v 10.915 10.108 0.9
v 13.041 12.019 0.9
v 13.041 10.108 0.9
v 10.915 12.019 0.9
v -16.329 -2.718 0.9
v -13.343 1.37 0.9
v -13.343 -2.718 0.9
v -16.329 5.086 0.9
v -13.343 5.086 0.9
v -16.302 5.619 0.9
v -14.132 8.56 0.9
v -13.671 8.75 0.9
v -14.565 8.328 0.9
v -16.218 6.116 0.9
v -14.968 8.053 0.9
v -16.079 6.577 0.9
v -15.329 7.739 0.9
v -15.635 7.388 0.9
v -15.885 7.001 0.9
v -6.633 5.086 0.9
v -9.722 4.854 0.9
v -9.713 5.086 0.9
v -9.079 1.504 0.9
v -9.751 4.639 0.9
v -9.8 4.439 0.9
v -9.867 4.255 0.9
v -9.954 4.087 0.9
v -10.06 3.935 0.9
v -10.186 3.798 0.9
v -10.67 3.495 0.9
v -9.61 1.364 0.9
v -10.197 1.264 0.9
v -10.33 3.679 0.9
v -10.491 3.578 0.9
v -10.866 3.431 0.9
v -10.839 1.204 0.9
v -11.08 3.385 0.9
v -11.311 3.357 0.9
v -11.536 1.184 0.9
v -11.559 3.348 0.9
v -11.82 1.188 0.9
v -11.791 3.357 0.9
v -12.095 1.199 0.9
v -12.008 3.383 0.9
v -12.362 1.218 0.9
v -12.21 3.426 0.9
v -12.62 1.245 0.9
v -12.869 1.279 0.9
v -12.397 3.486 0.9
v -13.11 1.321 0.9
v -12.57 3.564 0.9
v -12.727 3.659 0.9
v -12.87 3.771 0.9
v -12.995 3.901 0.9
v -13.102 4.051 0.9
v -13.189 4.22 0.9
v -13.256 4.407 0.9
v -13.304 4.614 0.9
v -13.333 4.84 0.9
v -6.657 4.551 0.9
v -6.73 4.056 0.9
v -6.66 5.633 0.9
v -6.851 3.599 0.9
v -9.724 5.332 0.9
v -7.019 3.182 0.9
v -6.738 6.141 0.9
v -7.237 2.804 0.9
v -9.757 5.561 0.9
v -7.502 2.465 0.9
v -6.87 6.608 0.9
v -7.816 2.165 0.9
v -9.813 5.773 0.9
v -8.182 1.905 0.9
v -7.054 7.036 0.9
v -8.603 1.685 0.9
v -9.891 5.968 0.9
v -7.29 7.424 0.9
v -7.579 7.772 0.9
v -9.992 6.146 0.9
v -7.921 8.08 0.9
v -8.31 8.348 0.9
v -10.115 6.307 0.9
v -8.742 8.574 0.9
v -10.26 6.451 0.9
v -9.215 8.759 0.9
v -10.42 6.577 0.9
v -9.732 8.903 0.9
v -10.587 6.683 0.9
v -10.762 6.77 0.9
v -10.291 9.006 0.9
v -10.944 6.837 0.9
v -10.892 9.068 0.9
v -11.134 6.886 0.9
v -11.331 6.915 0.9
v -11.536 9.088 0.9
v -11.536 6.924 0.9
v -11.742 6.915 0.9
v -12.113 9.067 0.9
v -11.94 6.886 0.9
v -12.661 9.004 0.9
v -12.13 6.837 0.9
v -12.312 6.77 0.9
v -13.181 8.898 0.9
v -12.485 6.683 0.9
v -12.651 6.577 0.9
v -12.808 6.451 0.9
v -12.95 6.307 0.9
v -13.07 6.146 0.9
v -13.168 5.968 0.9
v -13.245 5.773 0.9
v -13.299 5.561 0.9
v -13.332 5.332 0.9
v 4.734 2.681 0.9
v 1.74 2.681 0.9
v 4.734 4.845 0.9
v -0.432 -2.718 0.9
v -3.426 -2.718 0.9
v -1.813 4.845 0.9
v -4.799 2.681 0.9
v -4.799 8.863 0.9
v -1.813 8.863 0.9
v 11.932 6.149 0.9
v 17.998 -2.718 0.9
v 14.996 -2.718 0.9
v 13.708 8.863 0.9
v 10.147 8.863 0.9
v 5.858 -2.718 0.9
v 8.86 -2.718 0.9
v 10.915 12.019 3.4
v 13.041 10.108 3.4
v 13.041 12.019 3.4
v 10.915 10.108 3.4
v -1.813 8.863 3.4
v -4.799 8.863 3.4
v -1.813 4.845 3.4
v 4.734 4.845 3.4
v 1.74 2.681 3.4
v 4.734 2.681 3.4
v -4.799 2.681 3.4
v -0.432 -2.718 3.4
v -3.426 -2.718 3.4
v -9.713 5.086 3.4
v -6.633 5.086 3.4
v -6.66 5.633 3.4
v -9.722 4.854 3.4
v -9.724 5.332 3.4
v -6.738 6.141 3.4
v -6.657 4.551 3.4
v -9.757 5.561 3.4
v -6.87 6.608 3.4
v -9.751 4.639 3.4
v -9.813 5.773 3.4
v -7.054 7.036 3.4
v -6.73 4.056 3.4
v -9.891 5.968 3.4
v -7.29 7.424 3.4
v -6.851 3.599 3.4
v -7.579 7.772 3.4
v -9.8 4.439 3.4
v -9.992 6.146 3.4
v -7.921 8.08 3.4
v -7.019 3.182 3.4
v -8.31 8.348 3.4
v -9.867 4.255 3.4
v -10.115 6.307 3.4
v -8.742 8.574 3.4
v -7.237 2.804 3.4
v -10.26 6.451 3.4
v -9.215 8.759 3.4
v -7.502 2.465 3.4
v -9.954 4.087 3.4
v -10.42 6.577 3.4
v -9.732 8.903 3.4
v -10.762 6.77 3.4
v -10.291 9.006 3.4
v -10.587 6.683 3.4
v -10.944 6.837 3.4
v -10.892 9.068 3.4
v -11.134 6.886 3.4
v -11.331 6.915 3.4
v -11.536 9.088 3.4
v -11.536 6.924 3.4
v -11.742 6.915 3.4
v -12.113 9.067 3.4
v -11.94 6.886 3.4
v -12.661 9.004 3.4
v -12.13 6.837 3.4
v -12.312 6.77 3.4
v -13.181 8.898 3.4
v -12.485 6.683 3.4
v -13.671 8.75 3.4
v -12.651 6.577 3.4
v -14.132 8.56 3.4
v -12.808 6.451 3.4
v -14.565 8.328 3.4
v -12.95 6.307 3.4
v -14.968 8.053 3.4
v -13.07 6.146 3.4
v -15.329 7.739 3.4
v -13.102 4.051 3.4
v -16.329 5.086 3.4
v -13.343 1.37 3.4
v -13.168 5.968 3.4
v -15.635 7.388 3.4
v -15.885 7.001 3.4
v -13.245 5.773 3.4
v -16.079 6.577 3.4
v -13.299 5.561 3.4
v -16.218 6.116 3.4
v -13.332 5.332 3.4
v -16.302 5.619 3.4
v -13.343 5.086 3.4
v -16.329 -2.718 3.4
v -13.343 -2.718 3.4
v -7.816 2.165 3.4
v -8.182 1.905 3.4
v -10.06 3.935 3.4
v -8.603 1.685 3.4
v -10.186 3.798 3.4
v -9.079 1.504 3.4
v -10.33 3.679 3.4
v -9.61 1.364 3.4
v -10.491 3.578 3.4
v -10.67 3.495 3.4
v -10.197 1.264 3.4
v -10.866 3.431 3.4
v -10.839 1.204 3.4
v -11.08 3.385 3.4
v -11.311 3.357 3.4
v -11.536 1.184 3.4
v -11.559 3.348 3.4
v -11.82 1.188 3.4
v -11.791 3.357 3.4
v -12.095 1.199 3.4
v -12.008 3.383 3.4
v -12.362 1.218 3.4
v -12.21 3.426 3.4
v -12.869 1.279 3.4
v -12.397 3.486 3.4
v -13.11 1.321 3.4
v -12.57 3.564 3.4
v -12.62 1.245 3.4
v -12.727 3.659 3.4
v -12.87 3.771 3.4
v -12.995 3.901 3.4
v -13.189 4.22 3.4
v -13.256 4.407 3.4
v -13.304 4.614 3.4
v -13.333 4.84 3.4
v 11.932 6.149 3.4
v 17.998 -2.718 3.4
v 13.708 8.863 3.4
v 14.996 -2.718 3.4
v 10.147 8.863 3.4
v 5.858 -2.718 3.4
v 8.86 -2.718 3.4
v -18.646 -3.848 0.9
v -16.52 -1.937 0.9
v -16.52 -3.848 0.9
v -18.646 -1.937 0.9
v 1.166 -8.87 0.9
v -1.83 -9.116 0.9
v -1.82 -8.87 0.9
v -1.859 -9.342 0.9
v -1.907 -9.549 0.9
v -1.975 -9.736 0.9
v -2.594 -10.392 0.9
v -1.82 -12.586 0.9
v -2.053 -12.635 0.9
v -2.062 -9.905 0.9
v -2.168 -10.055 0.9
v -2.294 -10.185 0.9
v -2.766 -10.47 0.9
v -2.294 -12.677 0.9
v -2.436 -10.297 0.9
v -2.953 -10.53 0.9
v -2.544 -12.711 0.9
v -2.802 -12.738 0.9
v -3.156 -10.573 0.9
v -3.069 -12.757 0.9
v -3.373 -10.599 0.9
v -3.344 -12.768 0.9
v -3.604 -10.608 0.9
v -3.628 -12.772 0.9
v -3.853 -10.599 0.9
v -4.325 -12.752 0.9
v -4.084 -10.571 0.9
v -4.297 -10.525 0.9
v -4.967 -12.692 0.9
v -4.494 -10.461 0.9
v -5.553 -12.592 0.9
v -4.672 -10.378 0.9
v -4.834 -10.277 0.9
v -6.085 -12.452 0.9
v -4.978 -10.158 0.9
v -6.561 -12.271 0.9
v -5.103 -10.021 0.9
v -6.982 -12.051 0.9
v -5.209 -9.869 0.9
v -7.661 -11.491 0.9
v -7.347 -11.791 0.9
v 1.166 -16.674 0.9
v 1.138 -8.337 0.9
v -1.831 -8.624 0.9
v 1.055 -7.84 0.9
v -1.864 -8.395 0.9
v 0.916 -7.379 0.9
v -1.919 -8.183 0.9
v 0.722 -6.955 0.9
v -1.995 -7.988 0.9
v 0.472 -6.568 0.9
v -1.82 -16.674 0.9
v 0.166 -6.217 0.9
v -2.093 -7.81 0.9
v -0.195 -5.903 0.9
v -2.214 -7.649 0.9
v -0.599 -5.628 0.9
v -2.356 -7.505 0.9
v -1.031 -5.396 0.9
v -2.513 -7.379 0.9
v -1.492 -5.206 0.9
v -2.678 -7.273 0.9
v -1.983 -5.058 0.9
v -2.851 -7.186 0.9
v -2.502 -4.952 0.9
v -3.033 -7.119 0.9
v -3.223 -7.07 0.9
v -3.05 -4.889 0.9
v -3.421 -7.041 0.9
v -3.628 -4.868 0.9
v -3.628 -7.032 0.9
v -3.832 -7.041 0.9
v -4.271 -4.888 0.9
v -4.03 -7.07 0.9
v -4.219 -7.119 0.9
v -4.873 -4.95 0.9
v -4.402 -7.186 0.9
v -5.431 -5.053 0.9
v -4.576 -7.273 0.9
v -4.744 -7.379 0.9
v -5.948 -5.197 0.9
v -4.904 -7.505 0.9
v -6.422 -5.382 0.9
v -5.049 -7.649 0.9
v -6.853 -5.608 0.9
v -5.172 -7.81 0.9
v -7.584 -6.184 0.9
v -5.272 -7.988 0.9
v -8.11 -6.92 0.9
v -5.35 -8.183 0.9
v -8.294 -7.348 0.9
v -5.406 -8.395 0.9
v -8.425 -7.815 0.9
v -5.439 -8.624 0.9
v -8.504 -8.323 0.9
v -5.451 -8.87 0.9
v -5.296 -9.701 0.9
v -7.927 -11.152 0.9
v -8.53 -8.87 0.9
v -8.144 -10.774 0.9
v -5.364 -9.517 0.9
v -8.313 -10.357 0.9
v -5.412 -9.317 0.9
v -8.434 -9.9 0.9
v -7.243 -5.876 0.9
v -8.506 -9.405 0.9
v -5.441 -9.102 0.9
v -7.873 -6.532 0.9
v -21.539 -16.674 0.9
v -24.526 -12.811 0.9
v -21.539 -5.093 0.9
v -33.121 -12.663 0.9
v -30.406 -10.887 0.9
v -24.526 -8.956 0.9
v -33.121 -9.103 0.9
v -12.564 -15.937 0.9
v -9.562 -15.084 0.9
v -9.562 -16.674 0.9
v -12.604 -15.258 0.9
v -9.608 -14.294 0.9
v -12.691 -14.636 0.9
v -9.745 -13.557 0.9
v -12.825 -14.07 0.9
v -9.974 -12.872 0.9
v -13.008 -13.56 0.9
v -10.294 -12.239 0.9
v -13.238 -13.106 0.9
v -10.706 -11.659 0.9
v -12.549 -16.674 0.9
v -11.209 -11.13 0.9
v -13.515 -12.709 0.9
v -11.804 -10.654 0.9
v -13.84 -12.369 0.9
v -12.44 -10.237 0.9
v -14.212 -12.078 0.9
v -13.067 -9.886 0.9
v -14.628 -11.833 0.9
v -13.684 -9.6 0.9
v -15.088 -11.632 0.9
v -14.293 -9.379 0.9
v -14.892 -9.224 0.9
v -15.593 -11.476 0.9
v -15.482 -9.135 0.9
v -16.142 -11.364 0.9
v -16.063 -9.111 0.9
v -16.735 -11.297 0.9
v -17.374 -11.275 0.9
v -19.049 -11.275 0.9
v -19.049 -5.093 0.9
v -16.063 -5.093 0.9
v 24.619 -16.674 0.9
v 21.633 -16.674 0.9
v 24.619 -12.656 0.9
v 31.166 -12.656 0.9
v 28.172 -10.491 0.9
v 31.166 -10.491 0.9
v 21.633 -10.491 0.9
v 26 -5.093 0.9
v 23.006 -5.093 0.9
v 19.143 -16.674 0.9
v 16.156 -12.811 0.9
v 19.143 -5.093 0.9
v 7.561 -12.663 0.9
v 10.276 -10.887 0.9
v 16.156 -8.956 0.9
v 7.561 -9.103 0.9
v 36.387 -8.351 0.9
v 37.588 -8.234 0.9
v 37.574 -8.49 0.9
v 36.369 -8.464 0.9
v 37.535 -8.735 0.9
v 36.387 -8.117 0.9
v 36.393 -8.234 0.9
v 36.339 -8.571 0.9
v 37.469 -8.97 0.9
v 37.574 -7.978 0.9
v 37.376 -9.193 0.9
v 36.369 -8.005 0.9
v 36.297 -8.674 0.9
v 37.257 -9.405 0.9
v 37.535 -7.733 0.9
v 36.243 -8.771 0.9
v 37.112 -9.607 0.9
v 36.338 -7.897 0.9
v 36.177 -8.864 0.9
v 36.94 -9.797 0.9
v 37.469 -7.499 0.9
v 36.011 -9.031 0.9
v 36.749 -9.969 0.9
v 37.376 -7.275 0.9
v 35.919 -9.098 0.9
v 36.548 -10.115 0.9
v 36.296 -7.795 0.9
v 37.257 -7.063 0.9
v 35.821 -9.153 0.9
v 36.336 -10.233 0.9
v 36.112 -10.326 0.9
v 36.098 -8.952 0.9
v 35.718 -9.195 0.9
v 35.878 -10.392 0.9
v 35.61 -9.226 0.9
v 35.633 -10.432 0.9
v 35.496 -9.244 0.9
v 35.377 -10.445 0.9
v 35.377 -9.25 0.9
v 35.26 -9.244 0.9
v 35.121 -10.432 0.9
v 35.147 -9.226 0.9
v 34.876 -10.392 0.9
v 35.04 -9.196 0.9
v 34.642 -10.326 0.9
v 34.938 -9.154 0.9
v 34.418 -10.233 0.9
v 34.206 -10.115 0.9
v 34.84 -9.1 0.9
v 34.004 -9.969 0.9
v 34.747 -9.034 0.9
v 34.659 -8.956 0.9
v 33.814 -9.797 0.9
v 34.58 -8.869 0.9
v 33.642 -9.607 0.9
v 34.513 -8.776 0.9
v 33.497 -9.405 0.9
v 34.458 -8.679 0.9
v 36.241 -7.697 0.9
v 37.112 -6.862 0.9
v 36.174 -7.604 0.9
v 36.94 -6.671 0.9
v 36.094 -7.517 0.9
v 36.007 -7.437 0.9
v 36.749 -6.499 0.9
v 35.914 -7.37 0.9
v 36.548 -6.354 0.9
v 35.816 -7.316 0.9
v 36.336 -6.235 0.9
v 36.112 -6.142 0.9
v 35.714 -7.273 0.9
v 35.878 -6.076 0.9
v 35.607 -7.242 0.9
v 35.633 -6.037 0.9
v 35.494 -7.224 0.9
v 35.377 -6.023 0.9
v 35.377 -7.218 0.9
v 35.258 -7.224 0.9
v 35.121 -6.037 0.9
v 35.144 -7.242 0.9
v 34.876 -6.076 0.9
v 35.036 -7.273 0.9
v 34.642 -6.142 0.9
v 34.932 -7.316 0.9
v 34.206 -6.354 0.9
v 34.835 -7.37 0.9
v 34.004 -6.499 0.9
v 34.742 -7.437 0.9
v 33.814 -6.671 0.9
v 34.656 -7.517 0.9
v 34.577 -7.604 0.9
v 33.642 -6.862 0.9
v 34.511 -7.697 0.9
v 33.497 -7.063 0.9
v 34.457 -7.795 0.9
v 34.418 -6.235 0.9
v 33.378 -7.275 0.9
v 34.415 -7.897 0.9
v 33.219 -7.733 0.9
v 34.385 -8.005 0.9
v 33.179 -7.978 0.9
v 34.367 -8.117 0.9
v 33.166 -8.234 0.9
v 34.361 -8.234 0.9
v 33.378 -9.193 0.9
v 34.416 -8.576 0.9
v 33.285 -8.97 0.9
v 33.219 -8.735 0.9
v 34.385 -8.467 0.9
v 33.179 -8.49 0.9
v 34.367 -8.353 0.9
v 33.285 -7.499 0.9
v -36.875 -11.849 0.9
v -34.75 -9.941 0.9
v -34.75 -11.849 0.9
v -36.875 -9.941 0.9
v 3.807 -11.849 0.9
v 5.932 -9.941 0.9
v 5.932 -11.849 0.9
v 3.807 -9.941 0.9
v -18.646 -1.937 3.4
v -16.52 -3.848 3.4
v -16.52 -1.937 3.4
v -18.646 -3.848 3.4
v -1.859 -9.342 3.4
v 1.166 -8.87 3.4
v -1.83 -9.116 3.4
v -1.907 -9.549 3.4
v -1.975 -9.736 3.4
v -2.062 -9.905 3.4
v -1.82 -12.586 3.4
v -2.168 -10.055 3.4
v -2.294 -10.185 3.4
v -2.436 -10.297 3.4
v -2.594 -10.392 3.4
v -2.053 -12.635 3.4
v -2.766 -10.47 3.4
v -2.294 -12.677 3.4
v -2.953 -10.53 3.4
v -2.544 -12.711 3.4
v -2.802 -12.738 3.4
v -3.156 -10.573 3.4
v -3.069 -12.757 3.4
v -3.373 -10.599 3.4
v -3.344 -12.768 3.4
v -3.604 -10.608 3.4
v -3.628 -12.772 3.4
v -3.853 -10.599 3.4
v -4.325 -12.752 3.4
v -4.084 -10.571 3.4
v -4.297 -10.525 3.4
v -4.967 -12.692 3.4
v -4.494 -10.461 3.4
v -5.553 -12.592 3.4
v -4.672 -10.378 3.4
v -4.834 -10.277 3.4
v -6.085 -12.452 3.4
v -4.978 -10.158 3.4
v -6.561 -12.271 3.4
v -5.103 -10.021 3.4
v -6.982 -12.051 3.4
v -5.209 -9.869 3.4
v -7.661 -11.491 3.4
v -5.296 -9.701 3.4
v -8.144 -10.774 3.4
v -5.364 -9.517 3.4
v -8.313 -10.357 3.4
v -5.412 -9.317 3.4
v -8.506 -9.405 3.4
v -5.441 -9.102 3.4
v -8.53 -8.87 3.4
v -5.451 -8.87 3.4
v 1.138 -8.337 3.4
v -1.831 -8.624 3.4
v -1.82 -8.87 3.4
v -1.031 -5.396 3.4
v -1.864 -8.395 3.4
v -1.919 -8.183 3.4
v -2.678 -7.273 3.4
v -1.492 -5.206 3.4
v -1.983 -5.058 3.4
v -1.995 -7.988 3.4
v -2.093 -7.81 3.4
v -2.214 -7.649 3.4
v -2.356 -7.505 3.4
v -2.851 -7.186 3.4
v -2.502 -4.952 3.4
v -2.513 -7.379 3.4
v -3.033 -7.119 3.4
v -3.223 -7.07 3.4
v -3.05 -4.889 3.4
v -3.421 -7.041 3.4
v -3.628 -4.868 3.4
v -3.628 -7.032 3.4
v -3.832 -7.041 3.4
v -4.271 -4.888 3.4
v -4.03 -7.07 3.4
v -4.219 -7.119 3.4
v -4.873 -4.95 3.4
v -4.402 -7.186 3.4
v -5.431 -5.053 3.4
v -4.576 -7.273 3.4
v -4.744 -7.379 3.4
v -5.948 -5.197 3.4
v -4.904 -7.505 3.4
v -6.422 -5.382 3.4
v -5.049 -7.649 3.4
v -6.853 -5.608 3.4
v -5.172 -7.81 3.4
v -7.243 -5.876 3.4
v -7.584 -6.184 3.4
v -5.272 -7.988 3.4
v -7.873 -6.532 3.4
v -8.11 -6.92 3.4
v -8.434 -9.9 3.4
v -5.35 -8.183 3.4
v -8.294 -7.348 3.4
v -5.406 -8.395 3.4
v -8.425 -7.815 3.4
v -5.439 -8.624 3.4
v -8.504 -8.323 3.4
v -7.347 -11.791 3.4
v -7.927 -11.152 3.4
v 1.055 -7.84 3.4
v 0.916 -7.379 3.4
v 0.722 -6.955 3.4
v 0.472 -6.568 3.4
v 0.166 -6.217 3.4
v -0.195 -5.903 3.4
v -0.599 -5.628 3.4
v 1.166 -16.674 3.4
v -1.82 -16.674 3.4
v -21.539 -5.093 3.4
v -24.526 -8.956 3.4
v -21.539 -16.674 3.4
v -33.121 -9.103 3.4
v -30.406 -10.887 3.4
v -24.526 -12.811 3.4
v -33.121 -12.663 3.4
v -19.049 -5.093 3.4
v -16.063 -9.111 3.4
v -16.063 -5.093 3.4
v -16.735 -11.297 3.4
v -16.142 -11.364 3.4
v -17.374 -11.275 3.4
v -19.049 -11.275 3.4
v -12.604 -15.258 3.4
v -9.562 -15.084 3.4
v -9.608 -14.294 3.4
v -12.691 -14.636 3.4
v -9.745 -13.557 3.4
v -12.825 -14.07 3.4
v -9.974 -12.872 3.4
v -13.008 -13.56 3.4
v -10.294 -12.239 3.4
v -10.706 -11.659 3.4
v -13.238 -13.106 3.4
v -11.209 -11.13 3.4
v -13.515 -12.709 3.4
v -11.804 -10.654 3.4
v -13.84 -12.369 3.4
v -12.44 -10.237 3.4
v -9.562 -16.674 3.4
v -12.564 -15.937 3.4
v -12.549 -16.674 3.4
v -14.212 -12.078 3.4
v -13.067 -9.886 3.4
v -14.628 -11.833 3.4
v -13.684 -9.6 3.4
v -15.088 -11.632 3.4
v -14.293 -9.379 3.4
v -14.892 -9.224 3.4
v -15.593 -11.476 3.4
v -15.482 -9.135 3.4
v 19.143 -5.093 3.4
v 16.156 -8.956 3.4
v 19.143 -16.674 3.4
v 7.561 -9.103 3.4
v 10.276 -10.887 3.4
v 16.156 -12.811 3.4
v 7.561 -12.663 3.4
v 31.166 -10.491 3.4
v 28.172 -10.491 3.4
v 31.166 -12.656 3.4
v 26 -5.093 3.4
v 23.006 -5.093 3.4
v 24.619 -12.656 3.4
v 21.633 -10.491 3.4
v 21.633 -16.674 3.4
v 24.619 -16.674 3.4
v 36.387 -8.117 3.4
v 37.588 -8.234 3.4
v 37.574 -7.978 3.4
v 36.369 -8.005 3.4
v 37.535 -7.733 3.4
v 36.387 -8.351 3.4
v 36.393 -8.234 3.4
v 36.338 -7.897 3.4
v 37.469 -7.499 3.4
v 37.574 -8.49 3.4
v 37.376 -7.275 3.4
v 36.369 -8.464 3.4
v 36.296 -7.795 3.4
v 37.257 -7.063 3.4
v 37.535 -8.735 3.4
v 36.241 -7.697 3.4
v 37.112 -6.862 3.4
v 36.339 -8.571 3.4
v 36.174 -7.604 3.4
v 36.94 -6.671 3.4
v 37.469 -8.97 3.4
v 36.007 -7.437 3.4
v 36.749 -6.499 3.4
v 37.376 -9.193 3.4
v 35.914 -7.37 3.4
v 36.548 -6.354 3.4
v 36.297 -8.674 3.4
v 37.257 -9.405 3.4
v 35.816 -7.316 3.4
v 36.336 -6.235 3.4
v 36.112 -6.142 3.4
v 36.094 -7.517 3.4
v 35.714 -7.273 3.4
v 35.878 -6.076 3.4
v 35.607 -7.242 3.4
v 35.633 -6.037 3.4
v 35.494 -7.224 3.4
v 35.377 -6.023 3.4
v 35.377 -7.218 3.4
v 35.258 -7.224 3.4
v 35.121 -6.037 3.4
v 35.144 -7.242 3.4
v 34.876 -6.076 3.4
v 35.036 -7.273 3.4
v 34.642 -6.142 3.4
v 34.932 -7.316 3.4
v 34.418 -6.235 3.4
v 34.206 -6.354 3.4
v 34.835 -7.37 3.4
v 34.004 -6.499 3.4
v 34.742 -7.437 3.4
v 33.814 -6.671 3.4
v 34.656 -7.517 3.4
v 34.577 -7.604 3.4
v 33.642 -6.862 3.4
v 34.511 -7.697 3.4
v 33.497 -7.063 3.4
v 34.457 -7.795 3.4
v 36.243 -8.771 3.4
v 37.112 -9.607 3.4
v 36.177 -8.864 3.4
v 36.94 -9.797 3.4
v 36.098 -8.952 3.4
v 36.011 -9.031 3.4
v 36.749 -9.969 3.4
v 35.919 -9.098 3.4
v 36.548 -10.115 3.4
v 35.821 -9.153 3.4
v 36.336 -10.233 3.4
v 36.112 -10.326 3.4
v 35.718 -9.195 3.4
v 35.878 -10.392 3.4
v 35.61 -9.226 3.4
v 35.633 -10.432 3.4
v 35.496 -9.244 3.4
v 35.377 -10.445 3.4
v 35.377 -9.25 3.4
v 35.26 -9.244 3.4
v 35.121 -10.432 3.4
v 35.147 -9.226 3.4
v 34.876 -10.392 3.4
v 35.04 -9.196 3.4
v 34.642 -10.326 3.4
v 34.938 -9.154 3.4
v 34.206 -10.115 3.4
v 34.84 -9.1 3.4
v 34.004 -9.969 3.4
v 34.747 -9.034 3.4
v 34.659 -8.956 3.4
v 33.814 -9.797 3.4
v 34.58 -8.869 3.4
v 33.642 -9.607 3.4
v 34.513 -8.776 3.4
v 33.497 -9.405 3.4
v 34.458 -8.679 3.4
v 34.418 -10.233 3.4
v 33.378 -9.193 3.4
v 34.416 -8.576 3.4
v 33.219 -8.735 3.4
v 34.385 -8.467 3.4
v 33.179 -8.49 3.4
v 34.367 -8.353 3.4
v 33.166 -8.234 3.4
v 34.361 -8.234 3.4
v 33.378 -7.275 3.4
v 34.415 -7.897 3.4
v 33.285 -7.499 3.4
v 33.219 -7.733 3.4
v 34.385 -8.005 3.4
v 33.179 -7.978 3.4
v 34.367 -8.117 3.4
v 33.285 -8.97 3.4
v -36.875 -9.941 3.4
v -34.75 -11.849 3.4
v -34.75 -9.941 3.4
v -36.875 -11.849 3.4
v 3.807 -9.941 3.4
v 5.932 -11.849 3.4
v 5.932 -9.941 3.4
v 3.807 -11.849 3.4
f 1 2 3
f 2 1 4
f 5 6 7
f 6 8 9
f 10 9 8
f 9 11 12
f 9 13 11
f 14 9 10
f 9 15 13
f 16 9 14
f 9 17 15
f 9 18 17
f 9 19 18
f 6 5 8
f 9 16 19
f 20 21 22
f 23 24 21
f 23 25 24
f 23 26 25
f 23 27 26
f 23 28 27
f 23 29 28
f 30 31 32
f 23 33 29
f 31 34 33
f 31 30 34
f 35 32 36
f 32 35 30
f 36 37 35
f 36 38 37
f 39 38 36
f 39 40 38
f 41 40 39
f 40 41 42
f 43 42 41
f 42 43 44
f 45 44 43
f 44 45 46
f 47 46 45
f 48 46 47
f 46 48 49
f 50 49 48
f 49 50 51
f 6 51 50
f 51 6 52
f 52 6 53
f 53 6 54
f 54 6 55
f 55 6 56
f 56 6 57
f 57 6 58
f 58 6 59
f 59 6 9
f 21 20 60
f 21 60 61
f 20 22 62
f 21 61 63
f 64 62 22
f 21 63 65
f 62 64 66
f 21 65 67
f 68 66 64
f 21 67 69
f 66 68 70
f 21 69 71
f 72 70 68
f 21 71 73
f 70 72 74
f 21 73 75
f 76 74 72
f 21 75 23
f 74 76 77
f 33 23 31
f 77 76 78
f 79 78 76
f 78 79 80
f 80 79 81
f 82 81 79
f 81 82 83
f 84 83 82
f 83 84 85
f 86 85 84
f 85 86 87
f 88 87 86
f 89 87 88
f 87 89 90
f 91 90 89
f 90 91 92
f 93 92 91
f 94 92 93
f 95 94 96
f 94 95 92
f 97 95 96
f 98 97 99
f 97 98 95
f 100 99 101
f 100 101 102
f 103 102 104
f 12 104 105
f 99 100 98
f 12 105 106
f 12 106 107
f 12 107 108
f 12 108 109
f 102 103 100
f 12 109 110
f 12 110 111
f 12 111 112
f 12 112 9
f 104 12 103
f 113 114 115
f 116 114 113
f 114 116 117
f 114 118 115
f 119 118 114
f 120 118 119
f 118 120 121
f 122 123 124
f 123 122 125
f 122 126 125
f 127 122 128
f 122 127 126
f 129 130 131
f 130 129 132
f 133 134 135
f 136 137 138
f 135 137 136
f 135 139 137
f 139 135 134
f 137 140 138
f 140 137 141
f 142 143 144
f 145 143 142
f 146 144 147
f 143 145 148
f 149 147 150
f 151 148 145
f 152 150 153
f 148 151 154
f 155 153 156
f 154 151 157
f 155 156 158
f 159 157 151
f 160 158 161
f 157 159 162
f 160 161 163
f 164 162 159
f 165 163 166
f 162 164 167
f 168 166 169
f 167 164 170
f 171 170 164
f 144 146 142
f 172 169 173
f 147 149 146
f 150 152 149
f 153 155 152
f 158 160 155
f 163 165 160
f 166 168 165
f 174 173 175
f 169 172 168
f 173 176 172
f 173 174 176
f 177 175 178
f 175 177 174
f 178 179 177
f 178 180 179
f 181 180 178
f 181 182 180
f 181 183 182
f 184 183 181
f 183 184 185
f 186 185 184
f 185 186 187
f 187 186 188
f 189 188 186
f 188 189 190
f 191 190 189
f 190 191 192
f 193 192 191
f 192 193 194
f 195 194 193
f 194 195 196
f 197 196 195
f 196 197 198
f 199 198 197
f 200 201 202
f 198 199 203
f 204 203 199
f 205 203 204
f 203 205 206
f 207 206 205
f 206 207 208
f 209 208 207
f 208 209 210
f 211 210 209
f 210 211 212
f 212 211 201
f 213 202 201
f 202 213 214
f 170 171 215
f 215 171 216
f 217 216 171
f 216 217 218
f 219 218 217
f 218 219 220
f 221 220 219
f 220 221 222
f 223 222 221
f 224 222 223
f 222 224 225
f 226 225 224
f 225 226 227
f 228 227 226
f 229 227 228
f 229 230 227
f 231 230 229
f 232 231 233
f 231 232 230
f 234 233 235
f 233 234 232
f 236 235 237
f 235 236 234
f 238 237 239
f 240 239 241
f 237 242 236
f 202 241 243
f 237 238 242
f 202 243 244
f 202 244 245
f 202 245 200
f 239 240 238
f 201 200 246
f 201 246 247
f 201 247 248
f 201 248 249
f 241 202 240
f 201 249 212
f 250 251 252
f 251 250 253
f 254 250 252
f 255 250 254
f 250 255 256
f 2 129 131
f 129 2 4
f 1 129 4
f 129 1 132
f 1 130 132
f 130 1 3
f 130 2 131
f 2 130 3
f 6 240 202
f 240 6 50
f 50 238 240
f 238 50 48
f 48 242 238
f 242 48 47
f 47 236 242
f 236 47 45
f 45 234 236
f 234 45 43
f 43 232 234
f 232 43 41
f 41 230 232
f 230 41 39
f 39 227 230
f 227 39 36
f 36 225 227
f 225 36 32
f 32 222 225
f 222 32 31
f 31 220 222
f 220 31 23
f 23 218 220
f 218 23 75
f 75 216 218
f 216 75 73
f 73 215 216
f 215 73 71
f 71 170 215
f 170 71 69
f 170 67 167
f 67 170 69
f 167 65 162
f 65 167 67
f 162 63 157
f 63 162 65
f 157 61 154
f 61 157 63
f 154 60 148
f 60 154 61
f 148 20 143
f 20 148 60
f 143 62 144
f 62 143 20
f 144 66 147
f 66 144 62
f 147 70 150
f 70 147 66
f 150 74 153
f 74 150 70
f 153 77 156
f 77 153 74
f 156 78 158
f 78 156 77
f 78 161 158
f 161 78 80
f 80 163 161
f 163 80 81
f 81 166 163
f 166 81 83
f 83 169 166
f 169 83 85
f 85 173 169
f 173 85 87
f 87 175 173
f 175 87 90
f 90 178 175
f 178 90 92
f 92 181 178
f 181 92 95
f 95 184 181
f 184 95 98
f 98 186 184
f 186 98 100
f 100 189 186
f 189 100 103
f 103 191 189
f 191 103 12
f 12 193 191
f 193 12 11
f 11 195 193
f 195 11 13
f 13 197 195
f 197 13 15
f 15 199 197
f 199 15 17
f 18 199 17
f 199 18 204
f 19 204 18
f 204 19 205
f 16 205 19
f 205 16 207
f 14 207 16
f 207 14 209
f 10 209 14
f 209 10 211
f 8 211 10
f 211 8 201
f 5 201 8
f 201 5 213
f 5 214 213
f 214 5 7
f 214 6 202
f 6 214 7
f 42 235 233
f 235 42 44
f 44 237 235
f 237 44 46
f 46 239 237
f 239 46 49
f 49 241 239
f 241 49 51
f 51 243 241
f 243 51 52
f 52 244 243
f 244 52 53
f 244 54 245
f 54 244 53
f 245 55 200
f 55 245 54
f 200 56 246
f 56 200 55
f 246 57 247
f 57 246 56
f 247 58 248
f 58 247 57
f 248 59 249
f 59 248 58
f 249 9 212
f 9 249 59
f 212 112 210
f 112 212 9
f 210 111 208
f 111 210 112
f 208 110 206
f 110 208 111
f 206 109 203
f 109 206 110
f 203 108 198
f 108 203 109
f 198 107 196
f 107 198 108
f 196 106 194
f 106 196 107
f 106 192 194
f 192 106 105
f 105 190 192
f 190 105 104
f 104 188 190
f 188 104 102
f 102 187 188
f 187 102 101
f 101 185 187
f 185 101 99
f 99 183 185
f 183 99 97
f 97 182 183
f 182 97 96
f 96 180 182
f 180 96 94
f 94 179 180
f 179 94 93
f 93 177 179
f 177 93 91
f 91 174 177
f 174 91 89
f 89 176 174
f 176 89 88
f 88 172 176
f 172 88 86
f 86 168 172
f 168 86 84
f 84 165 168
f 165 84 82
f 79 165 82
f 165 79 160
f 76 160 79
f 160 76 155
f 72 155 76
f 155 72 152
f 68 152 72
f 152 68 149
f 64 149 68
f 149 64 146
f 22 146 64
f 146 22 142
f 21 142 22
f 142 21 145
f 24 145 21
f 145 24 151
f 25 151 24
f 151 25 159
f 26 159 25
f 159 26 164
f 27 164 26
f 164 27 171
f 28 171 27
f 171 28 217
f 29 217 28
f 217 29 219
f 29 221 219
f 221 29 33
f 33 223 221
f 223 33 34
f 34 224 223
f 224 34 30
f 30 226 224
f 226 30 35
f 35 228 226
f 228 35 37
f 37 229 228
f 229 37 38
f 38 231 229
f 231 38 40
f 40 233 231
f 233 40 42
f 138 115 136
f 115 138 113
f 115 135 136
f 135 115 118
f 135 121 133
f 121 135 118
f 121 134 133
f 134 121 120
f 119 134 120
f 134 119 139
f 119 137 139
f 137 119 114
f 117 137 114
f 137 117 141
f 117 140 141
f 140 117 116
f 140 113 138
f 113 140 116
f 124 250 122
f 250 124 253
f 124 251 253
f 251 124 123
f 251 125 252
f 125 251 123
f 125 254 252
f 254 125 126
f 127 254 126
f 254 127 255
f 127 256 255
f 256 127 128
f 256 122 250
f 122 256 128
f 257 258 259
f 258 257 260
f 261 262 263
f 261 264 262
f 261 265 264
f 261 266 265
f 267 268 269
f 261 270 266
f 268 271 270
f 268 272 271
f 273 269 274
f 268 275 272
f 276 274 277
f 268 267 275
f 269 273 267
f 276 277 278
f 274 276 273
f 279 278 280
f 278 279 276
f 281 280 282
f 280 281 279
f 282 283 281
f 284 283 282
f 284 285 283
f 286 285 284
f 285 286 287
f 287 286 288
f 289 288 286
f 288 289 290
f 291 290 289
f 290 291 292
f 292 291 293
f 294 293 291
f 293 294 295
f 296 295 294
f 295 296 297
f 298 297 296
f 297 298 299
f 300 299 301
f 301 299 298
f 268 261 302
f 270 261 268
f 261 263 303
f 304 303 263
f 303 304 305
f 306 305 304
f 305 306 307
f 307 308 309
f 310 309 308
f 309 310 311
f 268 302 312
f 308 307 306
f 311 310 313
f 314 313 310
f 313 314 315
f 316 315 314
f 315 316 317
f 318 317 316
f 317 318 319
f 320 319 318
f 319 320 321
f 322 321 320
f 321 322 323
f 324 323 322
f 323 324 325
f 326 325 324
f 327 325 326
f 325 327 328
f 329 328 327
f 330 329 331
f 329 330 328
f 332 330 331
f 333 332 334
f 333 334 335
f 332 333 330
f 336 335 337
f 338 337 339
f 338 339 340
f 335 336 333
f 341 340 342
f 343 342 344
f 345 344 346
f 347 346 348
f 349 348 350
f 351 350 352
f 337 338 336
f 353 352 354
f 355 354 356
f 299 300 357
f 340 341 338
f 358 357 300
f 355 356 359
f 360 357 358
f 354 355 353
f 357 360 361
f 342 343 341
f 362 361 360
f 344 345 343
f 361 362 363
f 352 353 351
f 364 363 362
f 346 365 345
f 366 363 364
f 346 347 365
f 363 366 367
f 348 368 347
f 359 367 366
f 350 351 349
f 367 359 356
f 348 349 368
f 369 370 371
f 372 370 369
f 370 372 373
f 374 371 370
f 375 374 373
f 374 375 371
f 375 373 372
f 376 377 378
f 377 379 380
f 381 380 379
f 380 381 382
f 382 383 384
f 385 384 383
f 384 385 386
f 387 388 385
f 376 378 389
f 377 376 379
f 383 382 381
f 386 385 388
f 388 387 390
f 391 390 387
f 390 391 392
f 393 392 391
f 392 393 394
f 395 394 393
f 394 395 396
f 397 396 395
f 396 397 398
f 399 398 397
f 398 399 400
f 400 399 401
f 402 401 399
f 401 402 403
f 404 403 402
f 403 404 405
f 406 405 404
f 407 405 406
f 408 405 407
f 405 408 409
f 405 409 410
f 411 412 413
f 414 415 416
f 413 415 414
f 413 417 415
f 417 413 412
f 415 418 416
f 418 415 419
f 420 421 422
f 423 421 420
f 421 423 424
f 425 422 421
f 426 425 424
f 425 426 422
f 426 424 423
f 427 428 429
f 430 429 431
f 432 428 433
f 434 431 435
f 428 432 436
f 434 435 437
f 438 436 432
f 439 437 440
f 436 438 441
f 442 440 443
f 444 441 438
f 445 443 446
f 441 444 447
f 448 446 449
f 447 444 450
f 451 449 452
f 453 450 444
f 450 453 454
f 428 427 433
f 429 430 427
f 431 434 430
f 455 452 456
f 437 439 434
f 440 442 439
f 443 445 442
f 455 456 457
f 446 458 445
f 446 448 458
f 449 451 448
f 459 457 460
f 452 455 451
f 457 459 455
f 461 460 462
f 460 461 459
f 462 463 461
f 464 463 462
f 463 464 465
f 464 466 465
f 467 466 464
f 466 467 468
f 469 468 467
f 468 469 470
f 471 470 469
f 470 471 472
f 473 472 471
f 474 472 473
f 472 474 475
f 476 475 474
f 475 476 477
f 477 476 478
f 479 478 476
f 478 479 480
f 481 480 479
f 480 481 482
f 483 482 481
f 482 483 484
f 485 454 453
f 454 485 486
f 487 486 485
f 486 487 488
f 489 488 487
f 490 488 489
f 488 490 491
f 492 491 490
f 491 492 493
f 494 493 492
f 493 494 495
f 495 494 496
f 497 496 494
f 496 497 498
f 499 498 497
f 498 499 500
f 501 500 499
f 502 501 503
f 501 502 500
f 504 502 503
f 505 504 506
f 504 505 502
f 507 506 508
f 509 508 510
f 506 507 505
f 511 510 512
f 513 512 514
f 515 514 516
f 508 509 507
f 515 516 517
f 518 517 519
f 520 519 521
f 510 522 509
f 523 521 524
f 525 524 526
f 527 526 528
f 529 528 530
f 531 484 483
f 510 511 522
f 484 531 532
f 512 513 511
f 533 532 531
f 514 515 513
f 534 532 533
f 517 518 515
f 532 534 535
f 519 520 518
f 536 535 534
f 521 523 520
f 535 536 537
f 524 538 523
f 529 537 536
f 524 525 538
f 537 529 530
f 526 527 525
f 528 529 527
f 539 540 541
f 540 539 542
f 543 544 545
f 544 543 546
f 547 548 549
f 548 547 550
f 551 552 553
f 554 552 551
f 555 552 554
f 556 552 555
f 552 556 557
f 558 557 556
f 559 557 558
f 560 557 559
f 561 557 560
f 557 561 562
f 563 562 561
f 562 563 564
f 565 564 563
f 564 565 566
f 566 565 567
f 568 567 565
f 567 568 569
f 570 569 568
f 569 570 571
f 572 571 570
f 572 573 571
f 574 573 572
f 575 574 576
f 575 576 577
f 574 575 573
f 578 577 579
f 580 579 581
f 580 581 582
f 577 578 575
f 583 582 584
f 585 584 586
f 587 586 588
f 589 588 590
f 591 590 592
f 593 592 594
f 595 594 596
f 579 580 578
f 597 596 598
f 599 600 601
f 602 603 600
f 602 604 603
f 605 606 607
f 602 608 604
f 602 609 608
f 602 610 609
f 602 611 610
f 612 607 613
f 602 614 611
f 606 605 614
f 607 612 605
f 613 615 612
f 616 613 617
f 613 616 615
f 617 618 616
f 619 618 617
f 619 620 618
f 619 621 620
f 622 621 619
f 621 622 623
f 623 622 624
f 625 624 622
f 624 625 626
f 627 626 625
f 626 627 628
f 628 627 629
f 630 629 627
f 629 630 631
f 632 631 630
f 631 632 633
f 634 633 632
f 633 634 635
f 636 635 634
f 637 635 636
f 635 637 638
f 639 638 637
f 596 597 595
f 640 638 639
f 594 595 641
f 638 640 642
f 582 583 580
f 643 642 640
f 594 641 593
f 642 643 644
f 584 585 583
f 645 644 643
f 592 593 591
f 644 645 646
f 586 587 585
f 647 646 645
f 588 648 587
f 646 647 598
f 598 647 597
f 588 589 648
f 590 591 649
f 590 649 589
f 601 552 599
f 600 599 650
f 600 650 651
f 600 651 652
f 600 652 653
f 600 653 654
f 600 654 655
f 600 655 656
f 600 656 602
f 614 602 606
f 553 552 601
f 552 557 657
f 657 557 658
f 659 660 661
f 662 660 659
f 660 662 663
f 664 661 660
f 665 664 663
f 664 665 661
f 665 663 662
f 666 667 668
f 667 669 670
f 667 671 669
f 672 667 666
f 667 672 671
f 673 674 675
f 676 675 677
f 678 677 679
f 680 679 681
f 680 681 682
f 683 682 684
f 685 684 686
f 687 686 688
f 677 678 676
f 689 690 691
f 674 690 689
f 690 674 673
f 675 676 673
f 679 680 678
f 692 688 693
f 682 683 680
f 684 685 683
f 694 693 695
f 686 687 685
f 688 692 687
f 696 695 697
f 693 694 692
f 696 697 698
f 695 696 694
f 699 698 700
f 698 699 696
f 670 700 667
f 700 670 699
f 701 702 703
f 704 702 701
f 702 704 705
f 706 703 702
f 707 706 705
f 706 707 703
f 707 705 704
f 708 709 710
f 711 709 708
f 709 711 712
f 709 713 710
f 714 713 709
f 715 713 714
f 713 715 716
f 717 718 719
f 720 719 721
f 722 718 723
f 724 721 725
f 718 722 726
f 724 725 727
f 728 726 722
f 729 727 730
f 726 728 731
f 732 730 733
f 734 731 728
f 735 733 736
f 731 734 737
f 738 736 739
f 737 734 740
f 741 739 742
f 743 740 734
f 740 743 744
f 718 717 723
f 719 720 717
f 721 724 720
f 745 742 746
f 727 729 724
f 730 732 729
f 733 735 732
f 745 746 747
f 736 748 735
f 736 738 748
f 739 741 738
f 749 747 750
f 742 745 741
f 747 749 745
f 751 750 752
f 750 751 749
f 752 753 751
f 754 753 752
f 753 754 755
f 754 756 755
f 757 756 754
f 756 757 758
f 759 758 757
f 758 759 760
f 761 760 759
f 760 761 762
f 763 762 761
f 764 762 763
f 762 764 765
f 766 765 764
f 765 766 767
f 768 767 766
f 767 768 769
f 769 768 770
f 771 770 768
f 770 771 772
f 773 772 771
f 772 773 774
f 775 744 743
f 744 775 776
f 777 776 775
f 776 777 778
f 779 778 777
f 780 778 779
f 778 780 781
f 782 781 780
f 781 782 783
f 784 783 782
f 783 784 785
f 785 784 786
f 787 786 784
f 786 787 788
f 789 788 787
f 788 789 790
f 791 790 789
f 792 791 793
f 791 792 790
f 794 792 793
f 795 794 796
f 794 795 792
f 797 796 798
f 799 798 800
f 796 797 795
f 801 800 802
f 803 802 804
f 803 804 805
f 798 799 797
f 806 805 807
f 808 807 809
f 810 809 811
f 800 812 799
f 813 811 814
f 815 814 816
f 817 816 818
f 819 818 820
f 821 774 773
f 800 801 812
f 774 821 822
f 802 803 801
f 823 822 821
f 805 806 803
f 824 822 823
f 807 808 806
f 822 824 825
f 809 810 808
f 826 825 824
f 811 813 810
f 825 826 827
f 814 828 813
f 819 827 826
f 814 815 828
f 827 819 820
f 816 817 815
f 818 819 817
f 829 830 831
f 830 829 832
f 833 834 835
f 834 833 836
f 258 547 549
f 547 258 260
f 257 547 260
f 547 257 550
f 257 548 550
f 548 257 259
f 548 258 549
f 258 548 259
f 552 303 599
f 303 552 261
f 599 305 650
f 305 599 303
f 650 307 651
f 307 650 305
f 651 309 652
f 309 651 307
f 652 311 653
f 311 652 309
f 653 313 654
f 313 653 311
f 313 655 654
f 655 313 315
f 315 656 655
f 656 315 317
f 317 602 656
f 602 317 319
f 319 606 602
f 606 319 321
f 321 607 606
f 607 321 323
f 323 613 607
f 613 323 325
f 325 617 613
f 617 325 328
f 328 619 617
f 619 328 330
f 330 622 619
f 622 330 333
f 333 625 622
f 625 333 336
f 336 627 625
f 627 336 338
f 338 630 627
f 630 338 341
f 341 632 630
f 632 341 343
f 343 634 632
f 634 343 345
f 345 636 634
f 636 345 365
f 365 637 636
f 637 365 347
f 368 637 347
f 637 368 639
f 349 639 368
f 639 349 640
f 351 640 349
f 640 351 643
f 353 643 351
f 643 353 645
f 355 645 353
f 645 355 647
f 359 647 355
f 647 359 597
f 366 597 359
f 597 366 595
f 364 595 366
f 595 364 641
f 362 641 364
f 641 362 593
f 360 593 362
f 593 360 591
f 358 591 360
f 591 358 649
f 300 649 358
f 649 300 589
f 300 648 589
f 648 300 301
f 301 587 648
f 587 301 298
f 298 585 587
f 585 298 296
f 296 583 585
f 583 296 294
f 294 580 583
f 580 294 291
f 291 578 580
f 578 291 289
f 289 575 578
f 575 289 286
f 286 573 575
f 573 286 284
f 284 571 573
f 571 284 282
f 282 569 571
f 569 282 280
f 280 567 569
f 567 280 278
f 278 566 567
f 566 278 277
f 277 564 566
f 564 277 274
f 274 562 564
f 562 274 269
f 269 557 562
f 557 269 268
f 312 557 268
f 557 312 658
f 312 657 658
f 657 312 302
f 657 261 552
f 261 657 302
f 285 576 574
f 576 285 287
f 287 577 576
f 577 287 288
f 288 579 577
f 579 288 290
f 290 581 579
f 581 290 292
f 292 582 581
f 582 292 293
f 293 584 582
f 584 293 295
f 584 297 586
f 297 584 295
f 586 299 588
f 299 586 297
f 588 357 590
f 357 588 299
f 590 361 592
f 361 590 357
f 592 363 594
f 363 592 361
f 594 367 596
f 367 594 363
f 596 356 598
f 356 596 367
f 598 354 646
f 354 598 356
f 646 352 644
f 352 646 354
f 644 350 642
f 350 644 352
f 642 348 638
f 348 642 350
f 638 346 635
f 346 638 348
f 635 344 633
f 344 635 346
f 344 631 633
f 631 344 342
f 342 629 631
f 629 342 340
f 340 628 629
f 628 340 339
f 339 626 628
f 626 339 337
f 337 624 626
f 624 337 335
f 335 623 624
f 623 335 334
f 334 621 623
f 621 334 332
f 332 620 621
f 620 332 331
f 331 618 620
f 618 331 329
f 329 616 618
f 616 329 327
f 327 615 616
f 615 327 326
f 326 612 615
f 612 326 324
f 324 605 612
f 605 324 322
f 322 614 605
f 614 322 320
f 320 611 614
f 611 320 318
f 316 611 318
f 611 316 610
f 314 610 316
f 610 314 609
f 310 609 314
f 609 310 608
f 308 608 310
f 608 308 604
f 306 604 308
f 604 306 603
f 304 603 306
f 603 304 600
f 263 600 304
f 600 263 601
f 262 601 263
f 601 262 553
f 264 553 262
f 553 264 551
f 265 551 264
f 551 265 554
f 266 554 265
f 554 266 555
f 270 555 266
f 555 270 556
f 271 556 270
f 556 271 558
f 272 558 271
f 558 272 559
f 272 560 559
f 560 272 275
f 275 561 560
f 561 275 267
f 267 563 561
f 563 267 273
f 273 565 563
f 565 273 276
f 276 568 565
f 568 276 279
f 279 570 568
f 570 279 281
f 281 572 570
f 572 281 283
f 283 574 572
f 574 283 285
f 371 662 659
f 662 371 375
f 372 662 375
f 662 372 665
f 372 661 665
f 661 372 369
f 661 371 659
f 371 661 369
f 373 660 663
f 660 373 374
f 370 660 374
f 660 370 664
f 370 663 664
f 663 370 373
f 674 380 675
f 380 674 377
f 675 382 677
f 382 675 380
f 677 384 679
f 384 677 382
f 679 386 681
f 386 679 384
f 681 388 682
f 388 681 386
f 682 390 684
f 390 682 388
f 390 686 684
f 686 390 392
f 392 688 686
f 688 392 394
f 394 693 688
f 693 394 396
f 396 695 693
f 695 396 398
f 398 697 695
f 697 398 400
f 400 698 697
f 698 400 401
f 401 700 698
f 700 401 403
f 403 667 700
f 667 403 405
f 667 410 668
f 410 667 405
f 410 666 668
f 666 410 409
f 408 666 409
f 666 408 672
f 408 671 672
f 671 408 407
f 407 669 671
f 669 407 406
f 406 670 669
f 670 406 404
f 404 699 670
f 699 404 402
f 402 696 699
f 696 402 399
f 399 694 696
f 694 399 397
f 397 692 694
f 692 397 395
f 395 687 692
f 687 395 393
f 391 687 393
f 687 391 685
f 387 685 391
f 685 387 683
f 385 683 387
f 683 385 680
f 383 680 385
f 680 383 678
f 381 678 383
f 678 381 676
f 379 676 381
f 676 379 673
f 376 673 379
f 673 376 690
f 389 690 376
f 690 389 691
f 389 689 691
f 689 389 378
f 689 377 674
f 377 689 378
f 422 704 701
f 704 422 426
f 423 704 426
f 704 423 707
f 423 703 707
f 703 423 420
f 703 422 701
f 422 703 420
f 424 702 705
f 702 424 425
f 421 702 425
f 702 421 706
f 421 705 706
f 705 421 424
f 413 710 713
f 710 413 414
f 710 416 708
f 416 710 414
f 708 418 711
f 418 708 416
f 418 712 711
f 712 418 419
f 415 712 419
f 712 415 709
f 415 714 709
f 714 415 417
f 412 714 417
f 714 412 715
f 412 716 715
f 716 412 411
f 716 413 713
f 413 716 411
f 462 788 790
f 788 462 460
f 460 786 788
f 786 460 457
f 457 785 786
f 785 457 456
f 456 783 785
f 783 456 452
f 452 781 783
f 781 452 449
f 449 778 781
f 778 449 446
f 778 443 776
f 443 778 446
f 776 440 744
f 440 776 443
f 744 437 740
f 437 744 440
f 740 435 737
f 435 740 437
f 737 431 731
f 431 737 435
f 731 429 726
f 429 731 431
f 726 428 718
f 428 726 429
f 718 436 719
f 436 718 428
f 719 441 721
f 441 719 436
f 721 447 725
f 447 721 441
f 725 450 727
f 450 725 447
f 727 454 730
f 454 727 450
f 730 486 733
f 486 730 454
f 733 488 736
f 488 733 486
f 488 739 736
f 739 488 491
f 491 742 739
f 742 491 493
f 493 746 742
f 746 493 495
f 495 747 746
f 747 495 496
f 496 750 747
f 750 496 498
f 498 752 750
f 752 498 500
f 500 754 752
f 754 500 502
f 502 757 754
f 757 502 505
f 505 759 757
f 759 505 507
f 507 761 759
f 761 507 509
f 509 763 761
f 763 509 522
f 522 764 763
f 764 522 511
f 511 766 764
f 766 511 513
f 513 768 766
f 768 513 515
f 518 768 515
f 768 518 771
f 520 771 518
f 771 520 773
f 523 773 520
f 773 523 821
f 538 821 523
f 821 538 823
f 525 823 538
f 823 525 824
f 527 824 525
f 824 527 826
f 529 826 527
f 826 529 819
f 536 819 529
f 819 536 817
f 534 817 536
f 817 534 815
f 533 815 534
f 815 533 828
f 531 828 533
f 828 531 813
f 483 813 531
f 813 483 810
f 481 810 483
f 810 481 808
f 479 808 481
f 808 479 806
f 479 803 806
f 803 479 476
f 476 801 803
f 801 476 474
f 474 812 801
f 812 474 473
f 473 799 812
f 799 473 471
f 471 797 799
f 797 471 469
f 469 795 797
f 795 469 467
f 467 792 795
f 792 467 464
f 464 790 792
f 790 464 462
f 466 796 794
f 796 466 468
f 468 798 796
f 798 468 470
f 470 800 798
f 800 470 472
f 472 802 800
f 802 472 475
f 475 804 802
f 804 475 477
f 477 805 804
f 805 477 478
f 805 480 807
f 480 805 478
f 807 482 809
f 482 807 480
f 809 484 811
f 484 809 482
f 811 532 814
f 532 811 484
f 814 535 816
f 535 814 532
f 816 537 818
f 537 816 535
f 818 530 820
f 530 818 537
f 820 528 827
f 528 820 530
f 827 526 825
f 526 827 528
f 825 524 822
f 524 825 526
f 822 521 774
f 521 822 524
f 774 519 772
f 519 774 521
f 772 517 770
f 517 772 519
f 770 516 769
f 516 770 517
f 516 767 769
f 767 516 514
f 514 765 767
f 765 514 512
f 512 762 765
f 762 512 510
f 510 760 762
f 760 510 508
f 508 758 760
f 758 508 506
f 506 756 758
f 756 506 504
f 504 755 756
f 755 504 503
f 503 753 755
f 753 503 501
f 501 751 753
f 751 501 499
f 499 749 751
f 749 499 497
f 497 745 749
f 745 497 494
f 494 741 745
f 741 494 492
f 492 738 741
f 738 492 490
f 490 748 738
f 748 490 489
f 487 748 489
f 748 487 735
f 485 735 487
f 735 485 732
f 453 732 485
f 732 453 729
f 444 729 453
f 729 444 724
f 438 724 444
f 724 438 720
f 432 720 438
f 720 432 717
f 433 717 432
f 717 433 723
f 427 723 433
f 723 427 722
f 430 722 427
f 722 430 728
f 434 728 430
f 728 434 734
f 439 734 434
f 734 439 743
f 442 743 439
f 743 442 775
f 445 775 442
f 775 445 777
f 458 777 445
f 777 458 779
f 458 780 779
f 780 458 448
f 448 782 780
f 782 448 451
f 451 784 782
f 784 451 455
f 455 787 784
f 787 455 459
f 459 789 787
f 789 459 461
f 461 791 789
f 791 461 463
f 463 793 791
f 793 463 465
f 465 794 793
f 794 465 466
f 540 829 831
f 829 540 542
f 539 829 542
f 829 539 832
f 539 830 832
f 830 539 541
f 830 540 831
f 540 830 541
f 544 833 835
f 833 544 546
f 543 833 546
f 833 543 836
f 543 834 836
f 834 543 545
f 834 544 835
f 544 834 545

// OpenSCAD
$fn = 48;
  // syllabics (overlaid on icon, tallest)
  translate([0, 4.478, 0.900]) linear_extrude(height=2.500) text("ᑭᔭᐲ", size=11.439, halign="center", valign="center", font="Euphemia UCAS:style=Bold");
  translate([0, -9.478, 0.900]) linear_extrude(height=2.500) text("ᐗᓵᑫᐗᔨᐤ", size=11.439, halign="center", valign="center", font="Euphemia UCAS:style=Bold");
